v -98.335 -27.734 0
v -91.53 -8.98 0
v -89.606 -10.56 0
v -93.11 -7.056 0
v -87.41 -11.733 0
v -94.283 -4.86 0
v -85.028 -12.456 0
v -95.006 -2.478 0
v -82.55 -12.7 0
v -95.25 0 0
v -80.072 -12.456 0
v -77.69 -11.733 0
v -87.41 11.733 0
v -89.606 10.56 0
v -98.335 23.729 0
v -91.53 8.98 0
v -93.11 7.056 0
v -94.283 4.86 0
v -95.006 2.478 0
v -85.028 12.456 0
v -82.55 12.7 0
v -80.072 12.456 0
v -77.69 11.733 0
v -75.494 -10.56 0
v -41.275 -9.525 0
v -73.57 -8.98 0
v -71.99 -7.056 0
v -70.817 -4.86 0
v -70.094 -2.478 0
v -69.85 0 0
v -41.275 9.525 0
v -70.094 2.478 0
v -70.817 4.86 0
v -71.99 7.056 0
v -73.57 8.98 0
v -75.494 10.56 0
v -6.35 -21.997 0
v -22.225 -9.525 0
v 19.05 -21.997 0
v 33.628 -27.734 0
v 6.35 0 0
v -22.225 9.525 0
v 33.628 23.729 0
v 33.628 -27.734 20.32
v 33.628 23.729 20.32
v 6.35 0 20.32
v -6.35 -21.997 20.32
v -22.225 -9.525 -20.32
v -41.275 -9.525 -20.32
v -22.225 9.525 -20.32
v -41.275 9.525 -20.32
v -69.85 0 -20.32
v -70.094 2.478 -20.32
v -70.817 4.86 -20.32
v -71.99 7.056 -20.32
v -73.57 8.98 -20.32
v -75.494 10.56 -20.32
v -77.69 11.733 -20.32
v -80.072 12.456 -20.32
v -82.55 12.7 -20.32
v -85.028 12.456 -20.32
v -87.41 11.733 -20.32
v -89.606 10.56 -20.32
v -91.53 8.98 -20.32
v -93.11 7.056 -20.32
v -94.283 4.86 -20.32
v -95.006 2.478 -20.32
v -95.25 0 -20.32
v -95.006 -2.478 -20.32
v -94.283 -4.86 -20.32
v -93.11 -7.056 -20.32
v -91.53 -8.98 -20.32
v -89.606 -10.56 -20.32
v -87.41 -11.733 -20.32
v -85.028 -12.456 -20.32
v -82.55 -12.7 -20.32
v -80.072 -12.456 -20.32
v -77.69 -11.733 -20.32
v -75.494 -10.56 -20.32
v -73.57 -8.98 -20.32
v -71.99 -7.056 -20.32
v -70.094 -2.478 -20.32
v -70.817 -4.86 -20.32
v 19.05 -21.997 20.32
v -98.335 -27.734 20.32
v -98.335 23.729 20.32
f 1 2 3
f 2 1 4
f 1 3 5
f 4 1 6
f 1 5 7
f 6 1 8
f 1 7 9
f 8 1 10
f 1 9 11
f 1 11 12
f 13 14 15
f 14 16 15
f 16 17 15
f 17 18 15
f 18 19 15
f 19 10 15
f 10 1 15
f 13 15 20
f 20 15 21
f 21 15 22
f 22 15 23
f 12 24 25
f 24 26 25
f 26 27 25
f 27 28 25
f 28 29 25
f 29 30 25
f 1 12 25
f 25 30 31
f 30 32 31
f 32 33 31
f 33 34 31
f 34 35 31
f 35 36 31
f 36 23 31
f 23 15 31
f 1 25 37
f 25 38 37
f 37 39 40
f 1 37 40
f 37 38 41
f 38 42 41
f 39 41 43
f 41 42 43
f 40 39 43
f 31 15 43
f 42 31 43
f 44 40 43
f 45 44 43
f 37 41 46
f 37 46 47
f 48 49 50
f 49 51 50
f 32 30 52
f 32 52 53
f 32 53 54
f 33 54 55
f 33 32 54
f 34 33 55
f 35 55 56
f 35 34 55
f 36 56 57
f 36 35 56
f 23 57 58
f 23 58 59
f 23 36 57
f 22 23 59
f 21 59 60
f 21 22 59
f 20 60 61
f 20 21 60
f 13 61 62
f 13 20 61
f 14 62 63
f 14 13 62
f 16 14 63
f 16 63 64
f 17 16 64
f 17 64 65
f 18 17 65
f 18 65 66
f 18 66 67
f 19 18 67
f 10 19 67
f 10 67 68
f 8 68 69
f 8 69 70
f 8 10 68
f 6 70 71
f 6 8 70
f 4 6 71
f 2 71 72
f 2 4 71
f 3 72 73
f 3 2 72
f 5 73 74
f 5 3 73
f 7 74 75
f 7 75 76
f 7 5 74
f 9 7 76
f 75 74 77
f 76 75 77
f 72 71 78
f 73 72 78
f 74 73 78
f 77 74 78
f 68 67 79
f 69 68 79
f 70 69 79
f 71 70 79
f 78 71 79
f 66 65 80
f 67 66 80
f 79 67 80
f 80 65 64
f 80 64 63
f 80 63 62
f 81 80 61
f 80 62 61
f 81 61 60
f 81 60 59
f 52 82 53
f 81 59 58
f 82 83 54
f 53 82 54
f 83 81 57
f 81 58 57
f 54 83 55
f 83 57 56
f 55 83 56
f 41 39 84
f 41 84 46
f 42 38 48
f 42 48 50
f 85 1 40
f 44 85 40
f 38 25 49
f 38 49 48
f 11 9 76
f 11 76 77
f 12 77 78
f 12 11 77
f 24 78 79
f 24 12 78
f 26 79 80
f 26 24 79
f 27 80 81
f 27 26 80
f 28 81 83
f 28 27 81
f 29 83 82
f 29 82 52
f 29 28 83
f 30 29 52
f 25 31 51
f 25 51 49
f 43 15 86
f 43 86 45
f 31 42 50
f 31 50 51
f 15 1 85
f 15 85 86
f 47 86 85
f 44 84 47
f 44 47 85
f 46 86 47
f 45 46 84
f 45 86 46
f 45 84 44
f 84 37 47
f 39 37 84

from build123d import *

# Parameters (mm, degrees)
F1_W     = 131.9631
F1_H     = 51.463606
F2_DEPTH = 20.32
F3_DEPTH = 20.32
F4_DEPTH = 57.15


with BuildPart() as f2:
    # F1 (on Top) → F2 (new body)
    with BuildSketch(Plane.XY):
        with Locations((-32.353217, -2.002475)):
            Rectangle(F1_W, F1_H)
    extrude(amount=F2_DEPTH)

    # F0 (on Top) → F3 (join)
    with BuildSketch(Plane.XY):
        with BuildLine():
            ThreePointArc((-69.85, 0), (-91.530256, 8.980256), (-82.55, -12.7))
            ThreePointArc((-82.55, -12.7), (-73.569744, -8.980256), (-69.85, 0))
        make_face()
        Polygon((-41.275, -9.525), (-31.75, -9.525), (-22.225, -9.525), (-22.225, 9.525), (-41.275, 9.525), align=None)
    extrude(amount=-F3_DEPTH)

    # F0 (on Top) → F4 (cut)
    with BuildSketch(Plane.XY):
        Polygon((19.05, -21.997045), (6.35, 0), (-6.35, -21.997045), align=None)
    extrude(amount=F4_DEPTH, mode=Mode.SUBTRACT)


solid = f2.part
